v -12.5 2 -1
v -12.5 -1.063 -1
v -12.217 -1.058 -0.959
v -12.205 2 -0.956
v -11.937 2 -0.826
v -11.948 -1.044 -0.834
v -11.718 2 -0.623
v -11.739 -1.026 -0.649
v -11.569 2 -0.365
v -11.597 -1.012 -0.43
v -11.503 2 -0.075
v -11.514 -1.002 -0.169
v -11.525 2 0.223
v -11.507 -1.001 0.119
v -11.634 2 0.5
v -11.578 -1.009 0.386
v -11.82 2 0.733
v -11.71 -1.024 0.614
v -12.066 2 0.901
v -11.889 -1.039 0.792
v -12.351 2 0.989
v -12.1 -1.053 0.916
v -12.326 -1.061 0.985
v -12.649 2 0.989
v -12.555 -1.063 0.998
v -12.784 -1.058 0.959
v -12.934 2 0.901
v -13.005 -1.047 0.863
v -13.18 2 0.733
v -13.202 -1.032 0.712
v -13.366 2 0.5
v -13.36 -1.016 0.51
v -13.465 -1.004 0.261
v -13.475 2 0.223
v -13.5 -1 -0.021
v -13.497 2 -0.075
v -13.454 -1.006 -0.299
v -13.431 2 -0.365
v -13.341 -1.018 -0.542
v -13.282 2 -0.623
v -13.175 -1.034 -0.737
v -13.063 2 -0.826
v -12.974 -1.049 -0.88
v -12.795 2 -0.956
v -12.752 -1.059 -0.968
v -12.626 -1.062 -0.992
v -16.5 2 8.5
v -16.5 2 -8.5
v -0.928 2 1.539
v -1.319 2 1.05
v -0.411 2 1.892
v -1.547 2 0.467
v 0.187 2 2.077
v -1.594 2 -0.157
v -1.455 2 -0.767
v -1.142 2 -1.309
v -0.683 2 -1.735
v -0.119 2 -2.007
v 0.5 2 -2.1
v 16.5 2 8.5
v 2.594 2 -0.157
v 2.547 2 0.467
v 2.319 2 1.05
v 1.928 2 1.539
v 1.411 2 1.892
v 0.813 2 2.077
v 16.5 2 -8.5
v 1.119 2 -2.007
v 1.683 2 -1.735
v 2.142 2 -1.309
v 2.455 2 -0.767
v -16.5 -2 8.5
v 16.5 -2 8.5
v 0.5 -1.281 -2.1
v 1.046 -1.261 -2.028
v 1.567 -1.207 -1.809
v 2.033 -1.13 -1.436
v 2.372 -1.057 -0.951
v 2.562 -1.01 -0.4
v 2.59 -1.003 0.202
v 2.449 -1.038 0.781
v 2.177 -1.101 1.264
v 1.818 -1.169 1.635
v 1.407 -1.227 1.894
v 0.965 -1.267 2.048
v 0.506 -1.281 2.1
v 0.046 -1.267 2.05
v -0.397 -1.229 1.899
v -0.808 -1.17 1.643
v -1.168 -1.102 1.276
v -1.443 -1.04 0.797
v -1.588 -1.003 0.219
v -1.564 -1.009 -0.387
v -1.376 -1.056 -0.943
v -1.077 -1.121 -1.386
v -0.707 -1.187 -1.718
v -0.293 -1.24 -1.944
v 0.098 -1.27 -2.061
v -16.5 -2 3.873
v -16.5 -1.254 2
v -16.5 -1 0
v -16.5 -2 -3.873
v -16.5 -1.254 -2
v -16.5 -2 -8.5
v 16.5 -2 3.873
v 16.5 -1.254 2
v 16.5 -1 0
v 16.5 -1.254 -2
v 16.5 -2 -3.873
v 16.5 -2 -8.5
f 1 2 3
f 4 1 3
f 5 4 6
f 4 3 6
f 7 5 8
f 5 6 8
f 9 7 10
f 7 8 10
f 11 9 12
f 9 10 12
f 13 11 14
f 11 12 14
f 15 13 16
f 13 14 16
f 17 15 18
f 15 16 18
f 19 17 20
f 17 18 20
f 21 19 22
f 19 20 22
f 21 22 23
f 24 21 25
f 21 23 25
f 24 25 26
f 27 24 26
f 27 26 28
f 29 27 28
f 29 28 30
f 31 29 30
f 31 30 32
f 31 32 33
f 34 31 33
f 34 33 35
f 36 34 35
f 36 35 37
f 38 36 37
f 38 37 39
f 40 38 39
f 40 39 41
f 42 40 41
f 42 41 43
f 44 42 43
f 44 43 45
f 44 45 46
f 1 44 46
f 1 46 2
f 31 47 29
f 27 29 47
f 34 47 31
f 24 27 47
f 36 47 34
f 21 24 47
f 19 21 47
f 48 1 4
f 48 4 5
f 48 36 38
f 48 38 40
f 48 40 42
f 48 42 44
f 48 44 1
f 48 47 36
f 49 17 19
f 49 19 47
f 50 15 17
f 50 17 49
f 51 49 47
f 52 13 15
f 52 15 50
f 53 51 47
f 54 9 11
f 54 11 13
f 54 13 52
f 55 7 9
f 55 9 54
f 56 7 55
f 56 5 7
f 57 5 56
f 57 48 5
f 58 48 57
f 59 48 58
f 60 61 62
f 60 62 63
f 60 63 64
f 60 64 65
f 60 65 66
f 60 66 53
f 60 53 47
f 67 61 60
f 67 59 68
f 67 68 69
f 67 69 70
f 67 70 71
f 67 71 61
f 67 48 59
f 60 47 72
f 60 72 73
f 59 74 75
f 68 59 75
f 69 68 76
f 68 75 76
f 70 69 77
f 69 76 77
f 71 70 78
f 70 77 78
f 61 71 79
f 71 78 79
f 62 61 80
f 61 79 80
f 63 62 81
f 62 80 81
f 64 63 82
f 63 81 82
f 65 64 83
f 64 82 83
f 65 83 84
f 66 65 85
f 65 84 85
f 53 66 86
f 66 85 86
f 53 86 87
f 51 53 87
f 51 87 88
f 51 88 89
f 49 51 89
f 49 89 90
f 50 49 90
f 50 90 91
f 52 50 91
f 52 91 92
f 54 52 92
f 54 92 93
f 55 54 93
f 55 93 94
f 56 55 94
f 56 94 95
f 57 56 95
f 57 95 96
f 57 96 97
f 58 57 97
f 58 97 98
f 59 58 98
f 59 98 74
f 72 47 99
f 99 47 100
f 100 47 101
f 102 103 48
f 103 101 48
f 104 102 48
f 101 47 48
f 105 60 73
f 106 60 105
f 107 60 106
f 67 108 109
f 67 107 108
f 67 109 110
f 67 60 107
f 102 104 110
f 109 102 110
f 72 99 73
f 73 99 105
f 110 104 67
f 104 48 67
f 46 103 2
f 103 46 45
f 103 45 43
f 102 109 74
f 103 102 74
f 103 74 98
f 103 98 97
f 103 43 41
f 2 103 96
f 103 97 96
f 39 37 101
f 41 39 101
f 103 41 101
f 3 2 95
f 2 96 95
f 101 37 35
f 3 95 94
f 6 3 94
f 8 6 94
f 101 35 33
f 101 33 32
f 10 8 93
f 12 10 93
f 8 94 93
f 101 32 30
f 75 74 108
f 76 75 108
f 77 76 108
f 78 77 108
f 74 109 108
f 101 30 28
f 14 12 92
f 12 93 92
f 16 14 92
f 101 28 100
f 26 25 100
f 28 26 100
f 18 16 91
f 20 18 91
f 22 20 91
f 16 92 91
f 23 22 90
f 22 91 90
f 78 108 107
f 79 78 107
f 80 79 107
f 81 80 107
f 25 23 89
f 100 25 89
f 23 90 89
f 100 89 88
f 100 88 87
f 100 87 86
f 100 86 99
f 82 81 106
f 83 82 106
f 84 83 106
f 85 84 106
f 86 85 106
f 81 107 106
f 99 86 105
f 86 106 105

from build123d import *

# Parameters (mm, degrees)
SKETCH2_W             = 33
SKETCH2_H             = 17
BOSS_EXTRUDE1_DEPTH   = 2
M5_TAPPED_HOLE1_D     = 4.2
F_2_0MM_DOWEL_HOLE1_D = 2
SKETCH6_R             = 8
CUT_EXTRUDE1_DEPTH    = 35.135758377


with BuildPart() as part:
    # Sketch2 → Boss-Extrude1 (new, symmetric)
    with BuildSketch(Plane(origin=(0, 0, 0), x_dir=(1, 0, 0), z_dir=(0, 1, 0))):
        Rectangle(SKETCH2_W, SKETCH2_H)
    extrude(amount=BOSS_EXTRUDE1_DEPTH, both=True)

    # M5 Tapped Hole1 (through all)
    with Locations(Plane(origin=(0.5, 2, 0), x_dir=(0, 0, 1), z_dir=(0, 1, 0))):
        with Locations((0, 0)):
            Hole(M5_TAPPED_HOLE1_D / 2)

    # Ø2.0mm Dowel Hole1 (through all)
    with Locations(Plane(origin=(-12.5, 2, 0), x_dir=(0, 0, 1), z_dir=(0, 1, 0))):
        with Locations((0, 0)):
            Hole(F_2_0MM_DOWEL_HOLE1_D / 2)

    # Sketch6 → Cut-Extrude1 (cut, through all)
    with BuildSketch(Plane(origin=(16.5, 0, 0), x_dir=(0, 0, -1), z_dir=(1, 0, 0))):
        with Locations((0, -9)):
            Circle(SKETCH6_R)
    extrude(amount=-CUT_EXTRUDE1_DEPTH, mode=Mode.SUBTRACT)


solid = part.part
